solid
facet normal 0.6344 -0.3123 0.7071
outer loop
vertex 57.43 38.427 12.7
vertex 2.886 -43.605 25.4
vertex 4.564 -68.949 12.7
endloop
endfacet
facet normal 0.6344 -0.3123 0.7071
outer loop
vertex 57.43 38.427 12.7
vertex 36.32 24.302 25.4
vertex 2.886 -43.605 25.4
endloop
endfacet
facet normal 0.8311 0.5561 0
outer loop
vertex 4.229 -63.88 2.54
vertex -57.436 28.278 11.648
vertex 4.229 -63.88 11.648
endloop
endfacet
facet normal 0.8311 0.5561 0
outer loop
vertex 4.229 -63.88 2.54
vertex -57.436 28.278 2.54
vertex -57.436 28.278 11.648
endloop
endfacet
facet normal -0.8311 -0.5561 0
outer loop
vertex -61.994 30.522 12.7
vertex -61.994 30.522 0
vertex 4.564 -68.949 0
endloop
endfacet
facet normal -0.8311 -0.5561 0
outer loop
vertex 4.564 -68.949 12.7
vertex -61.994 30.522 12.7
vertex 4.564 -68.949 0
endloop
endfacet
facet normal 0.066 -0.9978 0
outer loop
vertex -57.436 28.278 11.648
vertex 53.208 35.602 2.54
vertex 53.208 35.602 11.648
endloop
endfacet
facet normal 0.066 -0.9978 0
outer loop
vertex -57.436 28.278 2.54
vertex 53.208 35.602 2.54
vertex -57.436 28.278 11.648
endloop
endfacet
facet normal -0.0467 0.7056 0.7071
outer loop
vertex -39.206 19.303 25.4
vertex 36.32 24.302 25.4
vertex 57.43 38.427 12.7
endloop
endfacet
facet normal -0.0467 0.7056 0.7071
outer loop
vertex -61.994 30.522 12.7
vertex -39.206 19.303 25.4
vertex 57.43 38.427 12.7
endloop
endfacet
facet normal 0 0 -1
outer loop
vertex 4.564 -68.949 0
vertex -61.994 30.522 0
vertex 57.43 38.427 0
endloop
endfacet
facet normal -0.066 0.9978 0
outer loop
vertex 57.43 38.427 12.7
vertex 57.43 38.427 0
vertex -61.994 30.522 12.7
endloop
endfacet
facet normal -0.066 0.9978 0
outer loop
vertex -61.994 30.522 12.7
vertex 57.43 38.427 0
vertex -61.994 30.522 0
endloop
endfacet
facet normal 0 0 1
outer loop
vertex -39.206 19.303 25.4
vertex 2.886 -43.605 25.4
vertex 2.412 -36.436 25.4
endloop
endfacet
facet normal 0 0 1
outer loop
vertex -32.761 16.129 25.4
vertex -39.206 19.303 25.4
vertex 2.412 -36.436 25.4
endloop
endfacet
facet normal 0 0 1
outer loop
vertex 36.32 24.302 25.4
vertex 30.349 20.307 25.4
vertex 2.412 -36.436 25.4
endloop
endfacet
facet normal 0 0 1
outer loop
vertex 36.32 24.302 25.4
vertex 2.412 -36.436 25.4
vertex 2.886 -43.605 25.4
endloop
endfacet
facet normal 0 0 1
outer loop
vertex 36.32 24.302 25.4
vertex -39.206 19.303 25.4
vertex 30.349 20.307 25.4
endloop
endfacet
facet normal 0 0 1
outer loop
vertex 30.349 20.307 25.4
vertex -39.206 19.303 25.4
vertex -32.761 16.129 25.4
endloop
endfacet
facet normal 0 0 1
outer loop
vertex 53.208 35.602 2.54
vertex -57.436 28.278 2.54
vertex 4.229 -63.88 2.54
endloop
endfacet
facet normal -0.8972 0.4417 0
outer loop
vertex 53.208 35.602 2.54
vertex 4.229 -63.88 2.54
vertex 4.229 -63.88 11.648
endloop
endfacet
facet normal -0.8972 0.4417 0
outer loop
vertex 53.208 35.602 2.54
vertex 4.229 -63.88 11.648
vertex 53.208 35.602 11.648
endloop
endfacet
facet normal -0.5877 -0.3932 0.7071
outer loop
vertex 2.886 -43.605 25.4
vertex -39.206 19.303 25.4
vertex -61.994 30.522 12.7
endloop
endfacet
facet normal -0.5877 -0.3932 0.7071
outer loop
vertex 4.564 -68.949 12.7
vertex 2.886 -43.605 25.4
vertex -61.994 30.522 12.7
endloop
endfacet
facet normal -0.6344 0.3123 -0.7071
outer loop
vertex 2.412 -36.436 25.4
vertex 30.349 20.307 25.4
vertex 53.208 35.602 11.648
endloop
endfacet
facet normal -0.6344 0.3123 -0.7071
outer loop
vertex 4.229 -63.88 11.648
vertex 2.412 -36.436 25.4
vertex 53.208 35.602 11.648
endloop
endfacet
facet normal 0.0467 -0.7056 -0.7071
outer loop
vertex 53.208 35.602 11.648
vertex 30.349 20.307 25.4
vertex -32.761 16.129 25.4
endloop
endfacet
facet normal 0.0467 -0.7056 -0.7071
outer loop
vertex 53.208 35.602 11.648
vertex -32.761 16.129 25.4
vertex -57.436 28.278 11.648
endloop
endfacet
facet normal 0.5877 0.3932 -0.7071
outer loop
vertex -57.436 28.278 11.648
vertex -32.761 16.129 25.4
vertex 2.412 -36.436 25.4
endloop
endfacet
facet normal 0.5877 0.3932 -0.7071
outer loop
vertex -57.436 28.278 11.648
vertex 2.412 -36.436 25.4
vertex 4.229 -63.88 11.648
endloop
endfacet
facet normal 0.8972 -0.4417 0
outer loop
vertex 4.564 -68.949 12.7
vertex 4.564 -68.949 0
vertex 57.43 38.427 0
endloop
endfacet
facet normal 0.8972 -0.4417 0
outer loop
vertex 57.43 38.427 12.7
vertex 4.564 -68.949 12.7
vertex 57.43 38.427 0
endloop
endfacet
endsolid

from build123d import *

# Parameters (mm, degrees)
F1_DEPTH = 25.4
F2_SIZE  = 12.7
F3_T     = -2.54


with BuildPart() as f1:
    # F0 (on Top) → F1 (new body)
    with BuildSketch(Plane.XY):
        Polygon((4.5641, -68.949298), (57.429793, 38.427275), (-61.993893, 30.522022), align=None)
    extrude(amount=F1_DEPTH)

    # F2
    f2_edges = [f1.edges().sort_by_distance(p)[0] for p in [
        (30.996947, -15.261011, 25.4),
        (-28.714897, -19.213638, 25.4),
        (-2.28205, 34.474649, 25.4),
    ]]
    chamfer(f2_edges, length=F2_SIZE)

    # F3
    f3_openings = [f1.faces().sort_by_distance(p)[0] for p in [
        (0, 0, 25.4),
    ]]
    offset(amount=F3_T, openings=f3_openings)


solid = f1.part
